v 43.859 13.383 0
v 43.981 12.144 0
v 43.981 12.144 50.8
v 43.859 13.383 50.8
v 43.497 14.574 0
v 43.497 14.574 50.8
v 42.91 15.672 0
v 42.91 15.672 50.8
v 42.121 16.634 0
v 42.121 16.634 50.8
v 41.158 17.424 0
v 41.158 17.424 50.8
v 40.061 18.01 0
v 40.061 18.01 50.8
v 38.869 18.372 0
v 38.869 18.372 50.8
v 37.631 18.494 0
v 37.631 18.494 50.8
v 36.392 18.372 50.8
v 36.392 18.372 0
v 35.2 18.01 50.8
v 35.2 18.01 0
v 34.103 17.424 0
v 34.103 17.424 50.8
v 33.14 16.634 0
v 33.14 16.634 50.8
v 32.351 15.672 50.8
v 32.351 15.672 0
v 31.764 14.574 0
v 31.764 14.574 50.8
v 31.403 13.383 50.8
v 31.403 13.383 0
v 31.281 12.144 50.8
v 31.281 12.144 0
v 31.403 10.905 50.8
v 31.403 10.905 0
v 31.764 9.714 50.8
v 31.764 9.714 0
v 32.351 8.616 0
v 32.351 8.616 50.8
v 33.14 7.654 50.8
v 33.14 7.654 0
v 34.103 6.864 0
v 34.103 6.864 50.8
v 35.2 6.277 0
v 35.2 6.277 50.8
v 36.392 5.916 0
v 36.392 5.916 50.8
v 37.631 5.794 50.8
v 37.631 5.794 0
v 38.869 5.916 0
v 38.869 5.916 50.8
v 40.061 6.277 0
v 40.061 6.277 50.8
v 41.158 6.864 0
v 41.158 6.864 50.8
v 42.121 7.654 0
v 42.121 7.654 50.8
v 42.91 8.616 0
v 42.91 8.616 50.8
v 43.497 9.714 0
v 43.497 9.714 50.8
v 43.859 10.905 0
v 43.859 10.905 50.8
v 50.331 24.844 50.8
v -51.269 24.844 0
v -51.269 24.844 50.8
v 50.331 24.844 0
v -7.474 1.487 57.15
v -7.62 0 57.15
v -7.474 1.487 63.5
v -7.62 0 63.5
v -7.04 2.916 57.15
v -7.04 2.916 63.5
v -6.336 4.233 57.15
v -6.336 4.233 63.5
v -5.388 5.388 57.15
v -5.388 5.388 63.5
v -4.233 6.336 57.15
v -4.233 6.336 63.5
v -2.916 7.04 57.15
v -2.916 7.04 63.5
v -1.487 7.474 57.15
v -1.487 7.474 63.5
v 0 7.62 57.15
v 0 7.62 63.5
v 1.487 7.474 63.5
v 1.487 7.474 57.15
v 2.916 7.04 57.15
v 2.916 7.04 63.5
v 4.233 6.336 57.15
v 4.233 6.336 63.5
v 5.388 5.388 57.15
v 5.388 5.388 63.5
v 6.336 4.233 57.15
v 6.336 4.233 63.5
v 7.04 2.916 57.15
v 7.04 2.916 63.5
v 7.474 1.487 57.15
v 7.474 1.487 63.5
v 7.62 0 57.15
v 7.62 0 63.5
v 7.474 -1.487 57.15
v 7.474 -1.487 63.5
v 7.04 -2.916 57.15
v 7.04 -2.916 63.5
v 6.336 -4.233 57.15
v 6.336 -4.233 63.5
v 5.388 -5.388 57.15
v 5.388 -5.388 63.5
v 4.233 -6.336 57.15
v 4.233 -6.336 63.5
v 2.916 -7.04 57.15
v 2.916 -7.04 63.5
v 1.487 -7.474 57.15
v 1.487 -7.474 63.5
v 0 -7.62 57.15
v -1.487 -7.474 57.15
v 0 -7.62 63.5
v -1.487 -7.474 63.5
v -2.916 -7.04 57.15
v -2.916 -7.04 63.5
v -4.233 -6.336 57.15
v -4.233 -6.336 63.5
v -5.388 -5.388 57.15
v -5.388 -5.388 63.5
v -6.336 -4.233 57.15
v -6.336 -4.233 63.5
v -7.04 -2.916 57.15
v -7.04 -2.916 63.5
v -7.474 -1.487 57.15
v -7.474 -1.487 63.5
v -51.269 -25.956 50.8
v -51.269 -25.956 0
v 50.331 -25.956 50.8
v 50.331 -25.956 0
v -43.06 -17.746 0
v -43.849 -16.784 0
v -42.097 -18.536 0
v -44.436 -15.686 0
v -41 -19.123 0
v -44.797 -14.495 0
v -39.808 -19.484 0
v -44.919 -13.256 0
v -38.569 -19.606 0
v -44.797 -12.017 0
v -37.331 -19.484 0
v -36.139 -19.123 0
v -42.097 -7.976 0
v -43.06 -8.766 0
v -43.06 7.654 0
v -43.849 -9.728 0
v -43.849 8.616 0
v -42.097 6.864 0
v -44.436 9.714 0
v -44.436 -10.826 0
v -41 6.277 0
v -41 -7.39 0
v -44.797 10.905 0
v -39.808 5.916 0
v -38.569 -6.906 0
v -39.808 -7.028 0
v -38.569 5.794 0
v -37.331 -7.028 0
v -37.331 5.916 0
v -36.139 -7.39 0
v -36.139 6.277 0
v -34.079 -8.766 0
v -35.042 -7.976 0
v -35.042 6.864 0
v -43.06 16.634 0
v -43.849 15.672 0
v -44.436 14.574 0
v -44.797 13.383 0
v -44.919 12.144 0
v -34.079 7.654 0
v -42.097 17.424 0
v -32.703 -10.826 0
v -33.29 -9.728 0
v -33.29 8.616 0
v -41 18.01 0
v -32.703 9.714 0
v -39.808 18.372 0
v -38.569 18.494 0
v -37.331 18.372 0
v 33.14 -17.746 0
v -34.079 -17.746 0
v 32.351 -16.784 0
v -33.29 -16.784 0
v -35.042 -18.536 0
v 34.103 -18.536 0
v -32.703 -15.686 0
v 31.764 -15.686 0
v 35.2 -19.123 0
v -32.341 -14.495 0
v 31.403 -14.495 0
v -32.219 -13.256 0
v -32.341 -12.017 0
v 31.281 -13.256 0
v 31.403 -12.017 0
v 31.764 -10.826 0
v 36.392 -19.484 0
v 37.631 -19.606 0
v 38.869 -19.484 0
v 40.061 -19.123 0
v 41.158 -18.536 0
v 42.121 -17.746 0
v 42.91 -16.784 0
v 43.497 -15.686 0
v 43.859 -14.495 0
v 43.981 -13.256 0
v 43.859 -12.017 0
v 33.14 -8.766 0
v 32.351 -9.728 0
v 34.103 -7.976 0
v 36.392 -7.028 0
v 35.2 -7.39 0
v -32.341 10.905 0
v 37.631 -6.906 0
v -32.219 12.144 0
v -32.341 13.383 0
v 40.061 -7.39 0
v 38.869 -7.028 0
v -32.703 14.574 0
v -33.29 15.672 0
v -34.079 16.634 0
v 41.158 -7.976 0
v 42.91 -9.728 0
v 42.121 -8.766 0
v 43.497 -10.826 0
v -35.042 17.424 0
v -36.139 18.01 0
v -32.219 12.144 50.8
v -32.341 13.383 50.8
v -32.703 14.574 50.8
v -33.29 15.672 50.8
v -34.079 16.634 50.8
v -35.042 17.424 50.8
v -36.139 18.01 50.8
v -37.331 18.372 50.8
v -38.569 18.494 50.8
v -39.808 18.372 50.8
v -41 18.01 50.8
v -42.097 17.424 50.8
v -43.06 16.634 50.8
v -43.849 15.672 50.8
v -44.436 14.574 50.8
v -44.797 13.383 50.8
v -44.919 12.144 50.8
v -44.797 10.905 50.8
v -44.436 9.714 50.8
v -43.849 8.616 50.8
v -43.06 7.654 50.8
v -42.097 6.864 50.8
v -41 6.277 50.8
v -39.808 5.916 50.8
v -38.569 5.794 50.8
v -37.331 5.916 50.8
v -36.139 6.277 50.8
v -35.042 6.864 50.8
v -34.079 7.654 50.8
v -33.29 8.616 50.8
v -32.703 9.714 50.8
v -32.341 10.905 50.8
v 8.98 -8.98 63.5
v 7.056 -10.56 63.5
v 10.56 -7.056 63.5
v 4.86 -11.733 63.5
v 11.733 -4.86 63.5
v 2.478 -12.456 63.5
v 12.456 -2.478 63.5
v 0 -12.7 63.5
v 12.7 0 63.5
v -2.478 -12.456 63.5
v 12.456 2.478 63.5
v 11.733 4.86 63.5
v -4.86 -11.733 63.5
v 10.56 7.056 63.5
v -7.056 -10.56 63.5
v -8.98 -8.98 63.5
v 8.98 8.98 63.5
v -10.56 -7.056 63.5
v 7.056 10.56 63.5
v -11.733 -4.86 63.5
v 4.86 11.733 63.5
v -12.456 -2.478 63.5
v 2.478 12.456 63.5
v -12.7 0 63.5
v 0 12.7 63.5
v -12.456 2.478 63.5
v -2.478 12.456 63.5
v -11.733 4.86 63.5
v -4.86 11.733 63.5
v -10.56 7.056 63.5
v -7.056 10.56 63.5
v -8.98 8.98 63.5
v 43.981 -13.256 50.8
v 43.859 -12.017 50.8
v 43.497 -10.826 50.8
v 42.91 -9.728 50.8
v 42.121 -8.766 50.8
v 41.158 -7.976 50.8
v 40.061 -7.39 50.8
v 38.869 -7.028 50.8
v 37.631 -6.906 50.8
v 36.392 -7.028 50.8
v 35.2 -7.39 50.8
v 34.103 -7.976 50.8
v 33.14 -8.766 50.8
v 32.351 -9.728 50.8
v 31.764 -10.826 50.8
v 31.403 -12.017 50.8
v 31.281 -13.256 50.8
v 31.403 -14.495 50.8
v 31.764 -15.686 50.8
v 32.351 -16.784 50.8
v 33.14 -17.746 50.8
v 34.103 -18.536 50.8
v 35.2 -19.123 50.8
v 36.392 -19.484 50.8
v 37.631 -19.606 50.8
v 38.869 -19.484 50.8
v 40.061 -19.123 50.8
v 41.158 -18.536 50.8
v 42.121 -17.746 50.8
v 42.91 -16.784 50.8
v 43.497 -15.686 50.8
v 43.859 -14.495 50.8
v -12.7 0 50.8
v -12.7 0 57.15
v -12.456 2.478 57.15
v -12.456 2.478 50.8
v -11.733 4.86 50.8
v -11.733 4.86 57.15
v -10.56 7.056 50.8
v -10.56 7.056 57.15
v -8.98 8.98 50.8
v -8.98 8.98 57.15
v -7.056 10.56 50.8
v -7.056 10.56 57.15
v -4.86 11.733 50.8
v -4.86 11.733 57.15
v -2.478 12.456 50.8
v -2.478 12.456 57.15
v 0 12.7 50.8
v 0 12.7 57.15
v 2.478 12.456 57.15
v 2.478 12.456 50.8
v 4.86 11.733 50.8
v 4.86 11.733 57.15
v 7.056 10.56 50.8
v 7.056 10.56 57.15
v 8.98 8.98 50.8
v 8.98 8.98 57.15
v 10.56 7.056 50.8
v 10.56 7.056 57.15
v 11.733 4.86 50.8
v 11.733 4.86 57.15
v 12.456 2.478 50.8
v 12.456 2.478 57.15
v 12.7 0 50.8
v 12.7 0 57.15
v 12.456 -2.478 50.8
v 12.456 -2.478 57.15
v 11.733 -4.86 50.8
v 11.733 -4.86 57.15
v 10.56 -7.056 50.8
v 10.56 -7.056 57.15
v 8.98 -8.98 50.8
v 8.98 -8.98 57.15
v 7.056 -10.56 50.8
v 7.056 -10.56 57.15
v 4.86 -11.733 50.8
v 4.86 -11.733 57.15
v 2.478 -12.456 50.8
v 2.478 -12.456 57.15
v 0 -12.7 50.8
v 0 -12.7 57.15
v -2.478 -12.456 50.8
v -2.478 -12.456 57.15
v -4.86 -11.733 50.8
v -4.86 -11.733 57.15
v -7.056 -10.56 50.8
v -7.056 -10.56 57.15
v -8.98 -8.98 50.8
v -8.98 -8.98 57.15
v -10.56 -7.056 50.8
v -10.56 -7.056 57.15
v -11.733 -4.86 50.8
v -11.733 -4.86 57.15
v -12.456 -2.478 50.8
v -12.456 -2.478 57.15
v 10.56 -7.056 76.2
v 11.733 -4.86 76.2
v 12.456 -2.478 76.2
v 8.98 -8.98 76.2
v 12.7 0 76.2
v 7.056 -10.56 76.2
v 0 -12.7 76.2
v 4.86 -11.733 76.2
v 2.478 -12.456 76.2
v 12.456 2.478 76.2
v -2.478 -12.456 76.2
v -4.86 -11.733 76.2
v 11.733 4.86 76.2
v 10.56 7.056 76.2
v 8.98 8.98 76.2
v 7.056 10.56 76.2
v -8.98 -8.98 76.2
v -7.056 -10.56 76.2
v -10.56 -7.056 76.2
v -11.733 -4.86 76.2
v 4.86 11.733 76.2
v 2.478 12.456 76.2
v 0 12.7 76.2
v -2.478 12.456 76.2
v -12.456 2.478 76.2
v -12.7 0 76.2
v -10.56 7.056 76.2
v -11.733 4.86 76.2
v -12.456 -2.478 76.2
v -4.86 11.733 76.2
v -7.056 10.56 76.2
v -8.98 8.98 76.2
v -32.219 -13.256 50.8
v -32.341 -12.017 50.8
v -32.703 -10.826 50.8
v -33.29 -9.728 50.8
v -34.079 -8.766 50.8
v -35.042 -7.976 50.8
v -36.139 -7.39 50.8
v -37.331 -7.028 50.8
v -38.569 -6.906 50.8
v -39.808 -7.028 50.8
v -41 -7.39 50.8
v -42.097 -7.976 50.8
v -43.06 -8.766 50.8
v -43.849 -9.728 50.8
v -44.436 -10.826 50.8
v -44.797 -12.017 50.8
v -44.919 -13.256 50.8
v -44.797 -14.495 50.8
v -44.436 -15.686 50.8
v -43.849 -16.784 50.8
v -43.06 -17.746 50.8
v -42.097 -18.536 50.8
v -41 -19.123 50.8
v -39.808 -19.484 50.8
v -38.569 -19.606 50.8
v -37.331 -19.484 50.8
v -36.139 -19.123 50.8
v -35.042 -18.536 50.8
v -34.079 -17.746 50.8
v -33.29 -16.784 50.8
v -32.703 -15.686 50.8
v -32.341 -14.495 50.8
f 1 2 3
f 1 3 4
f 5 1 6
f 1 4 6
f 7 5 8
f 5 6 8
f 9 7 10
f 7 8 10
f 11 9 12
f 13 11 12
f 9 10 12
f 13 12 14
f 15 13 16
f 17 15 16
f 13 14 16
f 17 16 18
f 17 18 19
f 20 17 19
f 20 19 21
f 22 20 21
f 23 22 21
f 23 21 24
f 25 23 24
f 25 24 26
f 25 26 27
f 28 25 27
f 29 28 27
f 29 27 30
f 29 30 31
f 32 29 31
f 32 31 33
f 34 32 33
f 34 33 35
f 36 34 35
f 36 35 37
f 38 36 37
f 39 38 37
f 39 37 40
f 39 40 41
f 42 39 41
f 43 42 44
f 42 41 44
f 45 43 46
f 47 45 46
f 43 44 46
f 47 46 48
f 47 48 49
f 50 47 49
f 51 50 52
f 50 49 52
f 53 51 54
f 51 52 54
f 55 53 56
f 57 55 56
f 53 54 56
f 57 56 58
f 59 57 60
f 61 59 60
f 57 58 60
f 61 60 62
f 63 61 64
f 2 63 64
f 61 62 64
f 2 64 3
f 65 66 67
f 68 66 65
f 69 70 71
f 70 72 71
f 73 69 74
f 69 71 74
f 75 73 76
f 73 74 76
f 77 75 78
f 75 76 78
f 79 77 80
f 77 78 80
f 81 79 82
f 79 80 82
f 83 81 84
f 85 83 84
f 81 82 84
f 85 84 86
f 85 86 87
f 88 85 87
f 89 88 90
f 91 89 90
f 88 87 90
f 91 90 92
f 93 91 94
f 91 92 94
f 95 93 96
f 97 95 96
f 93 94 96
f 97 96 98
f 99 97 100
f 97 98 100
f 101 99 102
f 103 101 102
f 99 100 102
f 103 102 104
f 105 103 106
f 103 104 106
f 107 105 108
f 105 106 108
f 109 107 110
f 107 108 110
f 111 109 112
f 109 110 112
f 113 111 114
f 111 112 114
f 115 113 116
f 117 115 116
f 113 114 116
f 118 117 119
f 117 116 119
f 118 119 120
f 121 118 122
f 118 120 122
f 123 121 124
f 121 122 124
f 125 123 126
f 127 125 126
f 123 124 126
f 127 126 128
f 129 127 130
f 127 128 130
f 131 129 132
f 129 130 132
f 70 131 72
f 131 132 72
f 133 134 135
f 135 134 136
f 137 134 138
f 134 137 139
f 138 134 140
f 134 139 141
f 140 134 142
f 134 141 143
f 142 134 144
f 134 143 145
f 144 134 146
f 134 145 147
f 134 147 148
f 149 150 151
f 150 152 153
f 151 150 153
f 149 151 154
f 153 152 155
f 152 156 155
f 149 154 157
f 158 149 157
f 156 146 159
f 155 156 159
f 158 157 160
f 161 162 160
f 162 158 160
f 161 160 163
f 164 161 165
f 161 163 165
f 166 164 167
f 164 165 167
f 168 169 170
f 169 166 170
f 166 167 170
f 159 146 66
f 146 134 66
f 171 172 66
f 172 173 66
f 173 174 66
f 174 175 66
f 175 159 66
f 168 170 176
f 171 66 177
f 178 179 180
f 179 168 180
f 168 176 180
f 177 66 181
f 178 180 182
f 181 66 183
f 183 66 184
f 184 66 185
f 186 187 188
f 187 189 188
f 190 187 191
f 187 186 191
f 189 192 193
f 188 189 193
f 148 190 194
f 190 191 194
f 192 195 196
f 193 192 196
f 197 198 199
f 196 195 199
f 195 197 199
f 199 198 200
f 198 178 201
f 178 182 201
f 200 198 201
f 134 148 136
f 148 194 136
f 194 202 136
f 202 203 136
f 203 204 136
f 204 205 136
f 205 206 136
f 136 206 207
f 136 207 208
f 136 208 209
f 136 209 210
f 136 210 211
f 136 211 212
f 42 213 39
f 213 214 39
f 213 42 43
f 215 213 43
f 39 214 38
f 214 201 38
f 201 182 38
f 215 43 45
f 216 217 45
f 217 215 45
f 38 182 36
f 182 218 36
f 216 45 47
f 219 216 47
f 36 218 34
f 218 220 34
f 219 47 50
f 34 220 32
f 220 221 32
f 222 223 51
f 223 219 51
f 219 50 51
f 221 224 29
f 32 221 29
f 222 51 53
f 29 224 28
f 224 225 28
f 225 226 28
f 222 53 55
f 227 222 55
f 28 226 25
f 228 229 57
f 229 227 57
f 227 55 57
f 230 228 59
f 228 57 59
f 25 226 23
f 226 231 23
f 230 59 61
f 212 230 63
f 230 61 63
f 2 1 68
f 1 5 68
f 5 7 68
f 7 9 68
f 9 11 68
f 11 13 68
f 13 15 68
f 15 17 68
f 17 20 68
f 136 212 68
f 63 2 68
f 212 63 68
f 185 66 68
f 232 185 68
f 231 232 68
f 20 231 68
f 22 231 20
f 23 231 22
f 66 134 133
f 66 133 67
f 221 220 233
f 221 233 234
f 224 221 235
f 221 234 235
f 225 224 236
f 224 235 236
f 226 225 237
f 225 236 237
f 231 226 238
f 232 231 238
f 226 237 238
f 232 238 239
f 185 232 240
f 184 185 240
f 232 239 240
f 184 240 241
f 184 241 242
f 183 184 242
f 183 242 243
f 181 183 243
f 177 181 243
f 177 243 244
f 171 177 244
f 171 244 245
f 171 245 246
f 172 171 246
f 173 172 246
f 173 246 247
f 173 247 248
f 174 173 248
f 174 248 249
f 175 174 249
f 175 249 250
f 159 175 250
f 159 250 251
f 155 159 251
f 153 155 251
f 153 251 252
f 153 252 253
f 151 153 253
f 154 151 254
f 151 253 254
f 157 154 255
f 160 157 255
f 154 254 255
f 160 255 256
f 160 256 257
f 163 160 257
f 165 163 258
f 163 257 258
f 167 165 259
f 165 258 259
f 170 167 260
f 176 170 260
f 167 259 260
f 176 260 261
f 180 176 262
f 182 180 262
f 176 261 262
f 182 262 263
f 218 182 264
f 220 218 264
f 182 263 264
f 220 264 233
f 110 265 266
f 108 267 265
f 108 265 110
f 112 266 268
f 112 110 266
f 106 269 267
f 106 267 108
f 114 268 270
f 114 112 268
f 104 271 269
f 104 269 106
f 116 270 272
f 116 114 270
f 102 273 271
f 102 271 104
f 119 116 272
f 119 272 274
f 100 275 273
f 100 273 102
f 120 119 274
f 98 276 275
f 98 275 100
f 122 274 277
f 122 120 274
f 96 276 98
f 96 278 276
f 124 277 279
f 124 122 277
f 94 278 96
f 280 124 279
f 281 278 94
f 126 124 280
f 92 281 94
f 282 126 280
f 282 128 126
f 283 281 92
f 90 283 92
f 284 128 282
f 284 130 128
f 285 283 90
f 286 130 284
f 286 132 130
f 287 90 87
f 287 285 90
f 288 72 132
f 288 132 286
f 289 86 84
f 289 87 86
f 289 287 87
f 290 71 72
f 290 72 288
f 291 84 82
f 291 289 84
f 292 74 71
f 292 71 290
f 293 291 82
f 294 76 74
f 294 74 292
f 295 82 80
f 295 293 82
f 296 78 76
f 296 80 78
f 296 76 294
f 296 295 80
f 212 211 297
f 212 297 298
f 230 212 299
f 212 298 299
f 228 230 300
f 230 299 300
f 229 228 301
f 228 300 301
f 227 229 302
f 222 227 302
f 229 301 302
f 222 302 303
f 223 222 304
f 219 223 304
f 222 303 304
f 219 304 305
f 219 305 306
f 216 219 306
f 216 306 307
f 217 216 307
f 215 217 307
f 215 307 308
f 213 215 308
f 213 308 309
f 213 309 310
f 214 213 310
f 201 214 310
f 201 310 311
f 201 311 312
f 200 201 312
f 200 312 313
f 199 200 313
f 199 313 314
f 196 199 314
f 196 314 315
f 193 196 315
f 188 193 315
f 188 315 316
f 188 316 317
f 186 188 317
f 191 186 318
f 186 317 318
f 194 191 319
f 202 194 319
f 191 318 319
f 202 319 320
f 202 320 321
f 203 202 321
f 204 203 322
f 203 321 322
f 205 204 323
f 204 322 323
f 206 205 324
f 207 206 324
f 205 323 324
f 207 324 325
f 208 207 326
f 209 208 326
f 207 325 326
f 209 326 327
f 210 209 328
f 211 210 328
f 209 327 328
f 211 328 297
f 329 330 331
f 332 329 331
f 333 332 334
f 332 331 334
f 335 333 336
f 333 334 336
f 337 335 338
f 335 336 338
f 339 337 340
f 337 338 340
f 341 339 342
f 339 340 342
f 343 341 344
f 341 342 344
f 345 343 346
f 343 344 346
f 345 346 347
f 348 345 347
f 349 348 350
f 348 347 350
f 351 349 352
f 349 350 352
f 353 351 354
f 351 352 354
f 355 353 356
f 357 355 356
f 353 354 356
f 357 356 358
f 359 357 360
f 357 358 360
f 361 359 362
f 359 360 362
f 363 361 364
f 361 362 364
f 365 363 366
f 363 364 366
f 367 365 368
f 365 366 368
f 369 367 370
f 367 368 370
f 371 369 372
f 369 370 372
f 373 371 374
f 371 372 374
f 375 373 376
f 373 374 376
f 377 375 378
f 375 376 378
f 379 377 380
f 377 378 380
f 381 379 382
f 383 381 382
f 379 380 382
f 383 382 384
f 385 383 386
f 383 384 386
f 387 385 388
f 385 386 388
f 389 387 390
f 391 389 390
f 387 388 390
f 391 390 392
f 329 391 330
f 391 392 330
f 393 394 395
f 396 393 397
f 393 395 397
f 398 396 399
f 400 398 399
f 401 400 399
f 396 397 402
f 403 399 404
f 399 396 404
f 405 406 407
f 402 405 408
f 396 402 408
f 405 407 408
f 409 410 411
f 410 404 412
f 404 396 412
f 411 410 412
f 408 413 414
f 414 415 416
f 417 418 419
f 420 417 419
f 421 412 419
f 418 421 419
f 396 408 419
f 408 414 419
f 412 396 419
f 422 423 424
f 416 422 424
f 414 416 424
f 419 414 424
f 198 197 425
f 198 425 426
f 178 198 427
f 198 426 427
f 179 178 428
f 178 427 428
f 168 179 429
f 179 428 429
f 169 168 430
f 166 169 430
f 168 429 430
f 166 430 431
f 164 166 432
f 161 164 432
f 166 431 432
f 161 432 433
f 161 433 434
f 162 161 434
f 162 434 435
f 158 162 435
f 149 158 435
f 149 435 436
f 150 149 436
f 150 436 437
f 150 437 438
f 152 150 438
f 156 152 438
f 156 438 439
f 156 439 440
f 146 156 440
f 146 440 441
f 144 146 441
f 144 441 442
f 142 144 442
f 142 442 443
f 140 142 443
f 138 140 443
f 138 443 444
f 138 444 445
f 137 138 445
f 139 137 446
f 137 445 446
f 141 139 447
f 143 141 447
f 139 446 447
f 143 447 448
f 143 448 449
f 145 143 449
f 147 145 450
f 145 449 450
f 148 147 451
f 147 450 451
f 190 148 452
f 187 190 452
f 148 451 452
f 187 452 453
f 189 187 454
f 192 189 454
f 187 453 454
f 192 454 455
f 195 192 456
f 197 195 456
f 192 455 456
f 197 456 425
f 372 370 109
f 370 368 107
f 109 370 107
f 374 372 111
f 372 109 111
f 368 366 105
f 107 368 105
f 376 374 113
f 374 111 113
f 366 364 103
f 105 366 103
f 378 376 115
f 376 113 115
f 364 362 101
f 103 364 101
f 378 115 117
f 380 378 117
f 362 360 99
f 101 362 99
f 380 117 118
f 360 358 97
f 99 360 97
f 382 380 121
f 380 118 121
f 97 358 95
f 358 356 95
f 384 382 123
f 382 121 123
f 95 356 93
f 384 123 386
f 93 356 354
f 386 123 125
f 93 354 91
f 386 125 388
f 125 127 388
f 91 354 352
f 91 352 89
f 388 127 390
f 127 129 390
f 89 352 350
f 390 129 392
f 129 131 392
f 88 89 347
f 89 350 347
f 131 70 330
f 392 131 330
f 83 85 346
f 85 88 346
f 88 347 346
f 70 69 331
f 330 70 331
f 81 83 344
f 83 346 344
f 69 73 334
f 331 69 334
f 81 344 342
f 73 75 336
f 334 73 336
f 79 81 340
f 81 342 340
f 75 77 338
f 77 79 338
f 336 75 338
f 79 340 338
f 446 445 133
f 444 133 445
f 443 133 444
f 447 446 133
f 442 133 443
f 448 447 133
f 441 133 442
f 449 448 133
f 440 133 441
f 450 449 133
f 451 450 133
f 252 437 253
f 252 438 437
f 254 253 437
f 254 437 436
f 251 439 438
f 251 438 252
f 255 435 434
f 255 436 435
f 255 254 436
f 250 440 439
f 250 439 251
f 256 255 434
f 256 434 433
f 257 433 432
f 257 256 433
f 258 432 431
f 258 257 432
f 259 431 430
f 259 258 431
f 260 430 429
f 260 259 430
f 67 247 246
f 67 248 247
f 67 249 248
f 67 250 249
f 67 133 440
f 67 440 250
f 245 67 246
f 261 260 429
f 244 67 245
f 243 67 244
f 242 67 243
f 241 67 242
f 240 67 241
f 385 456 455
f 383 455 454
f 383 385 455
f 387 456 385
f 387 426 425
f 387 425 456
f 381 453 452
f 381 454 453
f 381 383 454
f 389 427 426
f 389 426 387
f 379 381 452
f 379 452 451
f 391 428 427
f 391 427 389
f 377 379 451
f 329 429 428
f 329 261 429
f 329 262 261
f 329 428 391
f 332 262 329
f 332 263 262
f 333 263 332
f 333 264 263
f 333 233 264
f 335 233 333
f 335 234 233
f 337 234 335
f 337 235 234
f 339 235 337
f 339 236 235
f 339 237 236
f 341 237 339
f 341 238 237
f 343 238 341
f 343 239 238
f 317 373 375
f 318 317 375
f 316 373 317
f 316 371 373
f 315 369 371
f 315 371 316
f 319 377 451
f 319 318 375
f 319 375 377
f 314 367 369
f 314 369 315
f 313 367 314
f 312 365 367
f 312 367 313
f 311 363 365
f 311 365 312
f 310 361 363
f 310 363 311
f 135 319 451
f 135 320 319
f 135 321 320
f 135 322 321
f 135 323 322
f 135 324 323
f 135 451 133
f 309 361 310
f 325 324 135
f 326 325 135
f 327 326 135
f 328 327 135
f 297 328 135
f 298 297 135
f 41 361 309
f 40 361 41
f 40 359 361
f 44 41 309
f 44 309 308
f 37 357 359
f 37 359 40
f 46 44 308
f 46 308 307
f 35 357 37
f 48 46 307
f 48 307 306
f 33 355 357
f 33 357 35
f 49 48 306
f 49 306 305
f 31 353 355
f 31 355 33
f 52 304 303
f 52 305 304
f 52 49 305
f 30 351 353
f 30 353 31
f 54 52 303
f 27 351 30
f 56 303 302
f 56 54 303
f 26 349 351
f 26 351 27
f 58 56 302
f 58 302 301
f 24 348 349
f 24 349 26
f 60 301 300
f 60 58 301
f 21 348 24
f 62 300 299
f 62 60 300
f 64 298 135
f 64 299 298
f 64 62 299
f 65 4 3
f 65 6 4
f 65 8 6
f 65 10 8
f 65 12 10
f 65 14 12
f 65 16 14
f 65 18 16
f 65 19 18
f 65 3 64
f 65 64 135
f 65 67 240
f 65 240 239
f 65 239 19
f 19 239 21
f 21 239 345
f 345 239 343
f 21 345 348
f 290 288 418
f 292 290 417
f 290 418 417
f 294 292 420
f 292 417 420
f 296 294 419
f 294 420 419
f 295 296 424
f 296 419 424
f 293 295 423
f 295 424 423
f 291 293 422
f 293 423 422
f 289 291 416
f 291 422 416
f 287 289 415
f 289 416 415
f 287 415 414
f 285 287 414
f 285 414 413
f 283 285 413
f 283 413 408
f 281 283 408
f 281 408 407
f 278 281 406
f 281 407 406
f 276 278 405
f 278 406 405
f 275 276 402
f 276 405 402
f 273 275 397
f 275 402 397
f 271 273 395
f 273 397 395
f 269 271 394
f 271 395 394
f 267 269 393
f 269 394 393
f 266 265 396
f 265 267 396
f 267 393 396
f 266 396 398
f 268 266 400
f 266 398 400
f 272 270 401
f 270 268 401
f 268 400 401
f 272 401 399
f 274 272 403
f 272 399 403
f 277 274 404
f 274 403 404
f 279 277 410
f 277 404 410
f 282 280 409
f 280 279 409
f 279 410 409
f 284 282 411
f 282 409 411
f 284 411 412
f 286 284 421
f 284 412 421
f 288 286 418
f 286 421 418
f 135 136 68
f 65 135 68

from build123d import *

# Parameters (mm, degrees)
F0_W     = 101.6
F0_H     = 50.8
F1_DEPTH = 50.8
F2_R     = 6.35
F3_DEPTH = 50.801
F4_W     = 12.7
F4_H     = 25.4
F6_W     = 19.9219
F6_H     = 6.35


with BuildPart() as f1:
    # F0 (on Top) → F1 (new body)
    with BuildSketch(Plane.XY):
        with Locations((-0.469463, -0.556229)):
            Rectangle(F0_W, F0_H)
    extrude(amount=F1_DEPTH)

    # F2 (on face) → F3 (cut, through all)
    with BuildSketch(Plane.XY.offset(50.8)):
        with Locations((-38.569463, 12.143771)):
            Circle(F2_R)
        with Locations((37.630537, 12.143771)):
            Circle(F2_R)
        with Locations((37.630537, -13.256229)):
            Circle(F2_R)
        with Locations((-38.569463, -13.256229)):
            Circle(F2_R)
    extrude(amount=-F3_DEPTH, mode=Mode.SUBTRACT)

    # F4 (on Front) → F5 (revolve)
    with BuildSketch(Plane.XZ):
        with Locations((-6.35, 63.5)):
            Rectangle(F4_W, F4_H)
    revolve(axis=Axis((0, 0, 63.5), (0, 0, -1)))

    # F6 (on Front) → F7 (revolve, cut)
    with BuildSketch(Plane.XZ):
        with Locations((-17.58095, 60.325)):
            Rectangle(F6_W, F6_H)
    revolve(axis=Axis((0, 0, 76.2), (0, 0, -1)), mode=Mode.SUBTRACT)


solid = f1.part
